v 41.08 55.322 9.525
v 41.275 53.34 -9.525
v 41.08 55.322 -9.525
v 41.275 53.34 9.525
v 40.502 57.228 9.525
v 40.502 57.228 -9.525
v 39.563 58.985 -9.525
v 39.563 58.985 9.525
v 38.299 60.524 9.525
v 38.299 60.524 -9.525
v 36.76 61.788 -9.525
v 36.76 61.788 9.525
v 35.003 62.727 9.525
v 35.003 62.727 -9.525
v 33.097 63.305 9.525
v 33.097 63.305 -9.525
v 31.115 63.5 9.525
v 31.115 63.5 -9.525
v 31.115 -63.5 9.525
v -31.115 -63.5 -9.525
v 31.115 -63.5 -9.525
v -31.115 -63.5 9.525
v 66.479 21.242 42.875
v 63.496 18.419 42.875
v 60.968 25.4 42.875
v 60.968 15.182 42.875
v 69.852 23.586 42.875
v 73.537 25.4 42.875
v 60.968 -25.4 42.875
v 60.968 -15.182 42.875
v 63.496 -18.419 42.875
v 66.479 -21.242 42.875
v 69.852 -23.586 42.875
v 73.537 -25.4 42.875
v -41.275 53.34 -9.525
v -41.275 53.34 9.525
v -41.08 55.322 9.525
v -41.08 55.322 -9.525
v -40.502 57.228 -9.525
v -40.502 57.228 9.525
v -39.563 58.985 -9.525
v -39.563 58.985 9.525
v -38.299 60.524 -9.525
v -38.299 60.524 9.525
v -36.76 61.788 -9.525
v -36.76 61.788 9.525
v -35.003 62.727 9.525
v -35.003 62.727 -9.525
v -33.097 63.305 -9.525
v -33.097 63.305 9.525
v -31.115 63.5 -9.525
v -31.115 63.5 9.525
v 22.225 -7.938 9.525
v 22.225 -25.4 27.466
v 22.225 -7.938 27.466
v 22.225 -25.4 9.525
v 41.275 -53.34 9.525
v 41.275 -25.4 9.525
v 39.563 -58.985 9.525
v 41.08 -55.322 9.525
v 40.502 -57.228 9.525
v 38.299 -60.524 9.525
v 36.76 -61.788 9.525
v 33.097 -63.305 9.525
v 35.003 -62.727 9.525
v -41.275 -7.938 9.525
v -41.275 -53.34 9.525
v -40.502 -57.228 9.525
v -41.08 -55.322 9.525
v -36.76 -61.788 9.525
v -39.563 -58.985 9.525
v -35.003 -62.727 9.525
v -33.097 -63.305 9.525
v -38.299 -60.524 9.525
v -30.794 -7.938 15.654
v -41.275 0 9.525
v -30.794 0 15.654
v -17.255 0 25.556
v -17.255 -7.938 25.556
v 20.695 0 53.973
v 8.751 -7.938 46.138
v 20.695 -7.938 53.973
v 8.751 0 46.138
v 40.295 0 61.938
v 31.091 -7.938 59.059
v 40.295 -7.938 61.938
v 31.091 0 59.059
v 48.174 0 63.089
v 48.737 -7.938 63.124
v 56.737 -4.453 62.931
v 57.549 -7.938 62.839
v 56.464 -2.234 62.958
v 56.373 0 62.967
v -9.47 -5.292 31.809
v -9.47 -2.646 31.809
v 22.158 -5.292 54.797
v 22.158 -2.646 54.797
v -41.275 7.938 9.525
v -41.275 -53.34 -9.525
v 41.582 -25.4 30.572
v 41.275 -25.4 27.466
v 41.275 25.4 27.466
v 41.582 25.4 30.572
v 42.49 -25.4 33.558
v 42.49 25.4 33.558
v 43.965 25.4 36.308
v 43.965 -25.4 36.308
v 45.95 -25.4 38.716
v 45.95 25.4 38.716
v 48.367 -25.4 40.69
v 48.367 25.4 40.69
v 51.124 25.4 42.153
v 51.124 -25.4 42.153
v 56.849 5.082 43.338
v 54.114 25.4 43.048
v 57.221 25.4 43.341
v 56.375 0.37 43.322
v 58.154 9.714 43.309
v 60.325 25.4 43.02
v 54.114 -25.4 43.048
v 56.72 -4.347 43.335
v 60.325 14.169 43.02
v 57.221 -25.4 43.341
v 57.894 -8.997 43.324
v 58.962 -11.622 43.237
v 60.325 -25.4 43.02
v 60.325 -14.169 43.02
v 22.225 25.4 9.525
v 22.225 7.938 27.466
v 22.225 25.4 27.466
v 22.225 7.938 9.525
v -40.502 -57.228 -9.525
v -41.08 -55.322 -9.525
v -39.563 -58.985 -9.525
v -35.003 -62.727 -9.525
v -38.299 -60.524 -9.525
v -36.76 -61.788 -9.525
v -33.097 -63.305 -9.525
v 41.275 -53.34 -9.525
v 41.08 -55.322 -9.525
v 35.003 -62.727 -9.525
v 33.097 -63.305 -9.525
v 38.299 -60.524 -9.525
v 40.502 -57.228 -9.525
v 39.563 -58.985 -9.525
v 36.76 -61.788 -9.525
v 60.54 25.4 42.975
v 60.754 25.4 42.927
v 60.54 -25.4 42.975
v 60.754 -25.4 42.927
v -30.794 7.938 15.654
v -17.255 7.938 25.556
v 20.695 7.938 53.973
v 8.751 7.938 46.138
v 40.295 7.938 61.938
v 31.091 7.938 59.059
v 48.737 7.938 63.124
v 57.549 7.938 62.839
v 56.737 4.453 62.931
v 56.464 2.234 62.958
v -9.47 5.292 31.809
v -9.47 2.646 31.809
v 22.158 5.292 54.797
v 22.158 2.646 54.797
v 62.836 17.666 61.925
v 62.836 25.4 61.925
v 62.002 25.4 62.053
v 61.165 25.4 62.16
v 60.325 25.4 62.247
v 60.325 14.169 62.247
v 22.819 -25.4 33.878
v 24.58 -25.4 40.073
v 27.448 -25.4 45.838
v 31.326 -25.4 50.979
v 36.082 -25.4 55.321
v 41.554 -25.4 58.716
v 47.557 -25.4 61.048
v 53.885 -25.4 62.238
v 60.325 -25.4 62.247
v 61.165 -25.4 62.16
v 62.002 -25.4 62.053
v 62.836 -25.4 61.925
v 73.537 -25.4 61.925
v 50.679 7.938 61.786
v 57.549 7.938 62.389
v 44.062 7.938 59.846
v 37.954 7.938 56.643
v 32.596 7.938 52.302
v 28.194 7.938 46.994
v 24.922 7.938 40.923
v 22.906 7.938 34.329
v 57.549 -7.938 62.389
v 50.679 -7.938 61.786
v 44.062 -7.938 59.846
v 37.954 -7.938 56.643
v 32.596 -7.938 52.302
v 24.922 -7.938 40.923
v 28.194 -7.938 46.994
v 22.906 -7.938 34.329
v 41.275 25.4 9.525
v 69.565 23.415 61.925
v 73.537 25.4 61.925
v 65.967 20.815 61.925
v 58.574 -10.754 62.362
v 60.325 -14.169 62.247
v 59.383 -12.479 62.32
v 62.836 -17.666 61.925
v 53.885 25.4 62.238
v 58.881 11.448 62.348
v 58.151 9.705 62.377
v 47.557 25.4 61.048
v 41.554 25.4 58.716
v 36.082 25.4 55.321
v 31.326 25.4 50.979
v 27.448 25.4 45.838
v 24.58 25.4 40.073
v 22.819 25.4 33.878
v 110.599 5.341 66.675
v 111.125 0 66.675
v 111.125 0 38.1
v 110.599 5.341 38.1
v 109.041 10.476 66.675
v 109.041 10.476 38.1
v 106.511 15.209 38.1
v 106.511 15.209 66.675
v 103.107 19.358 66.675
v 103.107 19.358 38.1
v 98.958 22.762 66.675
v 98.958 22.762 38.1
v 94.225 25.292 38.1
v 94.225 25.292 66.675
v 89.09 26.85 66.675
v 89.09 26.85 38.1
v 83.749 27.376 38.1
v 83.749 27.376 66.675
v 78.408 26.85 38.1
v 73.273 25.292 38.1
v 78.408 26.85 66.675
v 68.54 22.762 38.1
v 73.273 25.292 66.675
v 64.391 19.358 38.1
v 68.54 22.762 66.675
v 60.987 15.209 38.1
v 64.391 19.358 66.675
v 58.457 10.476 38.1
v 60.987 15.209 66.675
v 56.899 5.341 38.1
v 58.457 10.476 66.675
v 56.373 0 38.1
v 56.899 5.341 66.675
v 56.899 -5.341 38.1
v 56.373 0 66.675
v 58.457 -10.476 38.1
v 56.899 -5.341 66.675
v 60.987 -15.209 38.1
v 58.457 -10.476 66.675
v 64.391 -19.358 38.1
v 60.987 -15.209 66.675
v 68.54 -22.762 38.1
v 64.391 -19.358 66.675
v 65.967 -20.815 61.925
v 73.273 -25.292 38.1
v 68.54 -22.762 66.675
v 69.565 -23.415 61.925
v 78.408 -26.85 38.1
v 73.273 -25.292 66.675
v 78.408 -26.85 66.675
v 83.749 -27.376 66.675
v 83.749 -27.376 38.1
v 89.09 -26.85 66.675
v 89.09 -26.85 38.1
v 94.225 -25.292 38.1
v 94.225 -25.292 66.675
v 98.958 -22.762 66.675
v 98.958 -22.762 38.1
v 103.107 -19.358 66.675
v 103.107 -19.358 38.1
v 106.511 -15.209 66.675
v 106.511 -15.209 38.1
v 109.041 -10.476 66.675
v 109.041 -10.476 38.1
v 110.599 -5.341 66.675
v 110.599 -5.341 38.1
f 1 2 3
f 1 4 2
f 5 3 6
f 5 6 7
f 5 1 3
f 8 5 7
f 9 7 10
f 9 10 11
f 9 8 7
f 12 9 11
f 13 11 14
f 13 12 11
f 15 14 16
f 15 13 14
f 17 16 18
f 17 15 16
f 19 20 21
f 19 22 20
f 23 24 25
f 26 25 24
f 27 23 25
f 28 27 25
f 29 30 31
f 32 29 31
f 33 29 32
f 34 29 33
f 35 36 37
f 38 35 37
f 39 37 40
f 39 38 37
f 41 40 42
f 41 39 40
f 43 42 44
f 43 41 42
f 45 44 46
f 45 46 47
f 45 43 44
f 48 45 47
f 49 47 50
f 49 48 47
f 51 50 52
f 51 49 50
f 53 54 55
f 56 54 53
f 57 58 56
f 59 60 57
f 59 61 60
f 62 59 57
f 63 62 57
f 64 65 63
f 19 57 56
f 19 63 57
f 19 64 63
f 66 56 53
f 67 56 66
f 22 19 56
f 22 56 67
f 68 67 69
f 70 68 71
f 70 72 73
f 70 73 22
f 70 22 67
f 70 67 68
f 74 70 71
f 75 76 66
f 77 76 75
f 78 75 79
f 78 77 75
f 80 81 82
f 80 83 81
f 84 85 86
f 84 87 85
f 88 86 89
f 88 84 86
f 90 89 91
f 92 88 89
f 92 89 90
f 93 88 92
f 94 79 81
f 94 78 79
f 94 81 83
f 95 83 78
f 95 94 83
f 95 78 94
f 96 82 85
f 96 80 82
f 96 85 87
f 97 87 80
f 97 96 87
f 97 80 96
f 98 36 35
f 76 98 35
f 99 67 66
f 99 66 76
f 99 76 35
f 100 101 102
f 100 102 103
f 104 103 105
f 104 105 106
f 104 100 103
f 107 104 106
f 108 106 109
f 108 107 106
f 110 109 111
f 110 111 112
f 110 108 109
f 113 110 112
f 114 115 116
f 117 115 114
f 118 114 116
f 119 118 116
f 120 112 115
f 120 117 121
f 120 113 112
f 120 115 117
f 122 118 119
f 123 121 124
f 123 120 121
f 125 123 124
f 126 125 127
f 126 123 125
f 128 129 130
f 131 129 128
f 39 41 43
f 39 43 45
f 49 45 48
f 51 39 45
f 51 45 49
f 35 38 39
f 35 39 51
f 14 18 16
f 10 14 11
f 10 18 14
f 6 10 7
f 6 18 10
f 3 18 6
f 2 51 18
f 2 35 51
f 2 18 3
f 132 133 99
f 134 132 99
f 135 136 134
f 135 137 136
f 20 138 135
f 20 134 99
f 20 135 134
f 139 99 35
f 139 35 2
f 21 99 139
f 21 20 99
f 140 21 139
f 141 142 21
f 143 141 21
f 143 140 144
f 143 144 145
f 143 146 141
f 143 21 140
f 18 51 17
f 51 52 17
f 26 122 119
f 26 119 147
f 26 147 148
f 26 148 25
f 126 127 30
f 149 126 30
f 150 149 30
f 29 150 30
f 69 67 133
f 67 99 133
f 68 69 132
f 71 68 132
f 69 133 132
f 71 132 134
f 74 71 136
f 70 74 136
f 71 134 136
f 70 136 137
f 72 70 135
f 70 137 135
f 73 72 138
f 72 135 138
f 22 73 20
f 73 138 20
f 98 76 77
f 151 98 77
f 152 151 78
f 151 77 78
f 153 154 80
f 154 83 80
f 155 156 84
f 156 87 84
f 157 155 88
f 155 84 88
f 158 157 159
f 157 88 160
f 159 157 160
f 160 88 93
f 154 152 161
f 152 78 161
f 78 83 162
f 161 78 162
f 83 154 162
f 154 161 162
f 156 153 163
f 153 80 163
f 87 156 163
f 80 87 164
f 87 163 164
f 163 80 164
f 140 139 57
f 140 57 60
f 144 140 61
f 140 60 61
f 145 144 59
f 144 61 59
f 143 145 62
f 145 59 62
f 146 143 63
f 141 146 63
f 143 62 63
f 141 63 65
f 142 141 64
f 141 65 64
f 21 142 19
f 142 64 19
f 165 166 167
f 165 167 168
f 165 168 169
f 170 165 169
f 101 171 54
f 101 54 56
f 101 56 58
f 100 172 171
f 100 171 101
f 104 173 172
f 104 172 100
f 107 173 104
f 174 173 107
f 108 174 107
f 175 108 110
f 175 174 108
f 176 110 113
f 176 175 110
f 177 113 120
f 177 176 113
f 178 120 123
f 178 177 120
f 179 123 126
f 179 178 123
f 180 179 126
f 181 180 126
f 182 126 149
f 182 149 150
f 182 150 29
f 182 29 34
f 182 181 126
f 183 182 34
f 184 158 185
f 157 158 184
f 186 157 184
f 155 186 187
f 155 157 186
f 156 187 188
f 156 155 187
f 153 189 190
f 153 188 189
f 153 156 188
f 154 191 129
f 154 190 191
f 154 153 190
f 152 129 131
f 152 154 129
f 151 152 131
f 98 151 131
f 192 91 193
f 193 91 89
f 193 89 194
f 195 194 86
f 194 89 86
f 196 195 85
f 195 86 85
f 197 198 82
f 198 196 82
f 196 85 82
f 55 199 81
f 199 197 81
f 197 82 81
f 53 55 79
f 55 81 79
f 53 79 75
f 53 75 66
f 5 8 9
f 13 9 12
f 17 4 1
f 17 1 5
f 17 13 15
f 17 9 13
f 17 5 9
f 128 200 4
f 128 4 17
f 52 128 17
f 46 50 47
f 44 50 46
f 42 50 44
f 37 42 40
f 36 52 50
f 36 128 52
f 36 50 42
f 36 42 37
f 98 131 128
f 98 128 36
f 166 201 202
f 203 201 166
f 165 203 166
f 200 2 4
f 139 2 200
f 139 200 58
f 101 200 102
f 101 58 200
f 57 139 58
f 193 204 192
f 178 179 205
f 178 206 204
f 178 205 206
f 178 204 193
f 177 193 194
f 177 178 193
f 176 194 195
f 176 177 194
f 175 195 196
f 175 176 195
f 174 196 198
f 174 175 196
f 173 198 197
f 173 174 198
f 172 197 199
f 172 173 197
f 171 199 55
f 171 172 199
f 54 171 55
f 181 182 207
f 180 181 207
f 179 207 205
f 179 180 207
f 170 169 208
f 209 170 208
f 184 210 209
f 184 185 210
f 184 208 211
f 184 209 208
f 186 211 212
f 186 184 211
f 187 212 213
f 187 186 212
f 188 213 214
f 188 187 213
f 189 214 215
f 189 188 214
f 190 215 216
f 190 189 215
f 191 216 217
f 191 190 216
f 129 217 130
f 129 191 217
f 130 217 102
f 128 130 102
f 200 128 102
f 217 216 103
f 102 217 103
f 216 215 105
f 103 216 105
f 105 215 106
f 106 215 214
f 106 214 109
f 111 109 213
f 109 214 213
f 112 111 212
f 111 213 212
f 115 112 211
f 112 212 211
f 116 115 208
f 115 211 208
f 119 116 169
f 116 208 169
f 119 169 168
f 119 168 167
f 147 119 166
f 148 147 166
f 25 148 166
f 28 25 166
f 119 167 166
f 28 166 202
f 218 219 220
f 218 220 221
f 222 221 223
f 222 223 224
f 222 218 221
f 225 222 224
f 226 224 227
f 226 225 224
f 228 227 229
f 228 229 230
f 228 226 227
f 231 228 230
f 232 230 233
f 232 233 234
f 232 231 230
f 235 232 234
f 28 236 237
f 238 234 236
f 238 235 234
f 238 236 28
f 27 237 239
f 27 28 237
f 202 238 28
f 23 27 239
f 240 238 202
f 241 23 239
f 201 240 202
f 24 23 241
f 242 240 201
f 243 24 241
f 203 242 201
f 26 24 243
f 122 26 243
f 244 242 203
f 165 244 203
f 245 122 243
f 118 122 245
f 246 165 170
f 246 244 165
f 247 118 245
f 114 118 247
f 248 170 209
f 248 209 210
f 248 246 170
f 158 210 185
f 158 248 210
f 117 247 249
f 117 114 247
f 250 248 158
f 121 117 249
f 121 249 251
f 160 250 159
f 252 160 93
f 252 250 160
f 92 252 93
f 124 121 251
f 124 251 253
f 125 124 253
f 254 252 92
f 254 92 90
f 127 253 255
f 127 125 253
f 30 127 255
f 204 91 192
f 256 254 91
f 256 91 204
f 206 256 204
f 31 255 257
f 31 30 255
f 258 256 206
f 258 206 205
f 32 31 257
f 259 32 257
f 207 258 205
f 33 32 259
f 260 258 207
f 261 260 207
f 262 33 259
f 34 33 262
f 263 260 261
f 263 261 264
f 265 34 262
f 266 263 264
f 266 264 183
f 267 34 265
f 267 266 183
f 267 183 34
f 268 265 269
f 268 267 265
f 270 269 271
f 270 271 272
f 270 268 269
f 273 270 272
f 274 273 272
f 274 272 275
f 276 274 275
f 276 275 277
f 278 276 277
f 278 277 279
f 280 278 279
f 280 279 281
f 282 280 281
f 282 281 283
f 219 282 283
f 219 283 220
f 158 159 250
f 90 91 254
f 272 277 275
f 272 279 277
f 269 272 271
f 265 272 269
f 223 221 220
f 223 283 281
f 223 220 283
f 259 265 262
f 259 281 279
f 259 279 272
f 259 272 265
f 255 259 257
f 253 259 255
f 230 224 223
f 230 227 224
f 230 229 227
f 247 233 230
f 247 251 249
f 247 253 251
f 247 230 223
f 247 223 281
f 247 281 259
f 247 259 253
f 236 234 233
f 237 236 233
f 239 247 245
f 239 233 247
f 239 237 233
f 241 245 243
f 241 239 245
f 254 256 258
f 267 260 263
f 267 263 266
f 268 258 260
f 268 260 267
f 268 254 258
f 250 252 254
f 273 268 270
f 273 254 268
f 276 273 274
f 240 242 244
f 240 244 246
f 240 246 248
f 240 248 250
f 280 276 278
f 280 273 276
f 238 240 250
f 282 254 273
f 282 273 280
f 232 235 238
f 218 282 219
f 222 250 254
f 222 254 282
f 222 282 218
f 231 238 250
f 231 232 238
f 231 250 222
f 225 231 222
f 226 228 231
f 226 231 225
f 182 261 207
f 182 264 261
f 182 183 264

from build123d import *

# Parameters (mm, degrees)
F1_DEPTH = 63.5
F2_DEPTH = 25.4
F3_DEPTH = 25.4
F4_DEPTH = 7.9375
F6_R     = 10.16


with BuildPart() as f1:
    # F0 (on Front) → F1 (new body, symmetric)
    with BuildSketch(Plane.XZ):
        Polygon((22.225, 9.525), (-41.275, 9.525), (-41.275, -9.525), (41.275, -9.525), (41.275, 9.525), align=None)
    extrude(amount=F1_DEPTH, both=True)

    # F0 (on Front) → F2 (join, symmetric)
    with BuildSketch(Plane.XZ):
        with BuildLine():
            Line((22.225, 27.466178), (22.225, 9.525))
            Line((22.225, 9.525), (41.275, 9.525))
            Line((41.275, 9.525), (41.275, 27.466178))
            ThreePointArc((41.275, 27.466178), (47.109768, 39.762901), (60.325, 43.020438))
            Line((60.325, 43.020438), (60.325, 62.246561))
            ThreePointArc((60.325, 62.246561), (33.60357, 53.26), (22.225, 27.466178))
        make_face()
    extrude(amount=F2_DEPTH, both=True)

    # F0 (on Front) → F3 (join, symmetric)
    with BuildSketch(Plane.XZ):
        with BuildLine():
            ThreePointArc((62.836075, 61.9252), (61.58345, 62.10864), (60.325, 62.246561))
            Line((60.325, 62.246561), (60.325, 43.020438))
            ThreePointArc((60.325, 43.020438), (60.64729, 42.951158), (60.968073, 42.8752))
            Line((60.968073, 42.8752), (83.748926, 42.8752))
            Line((83.748926, 42.8752), (83.748926, 61.9252))
            Line((83.748926, 61.9252), (62.836075, 61.9252))
        make_face()
    extrude(amount=F3_DEPTH, both=True)

    # F0 (on Front) → F4 (join, symmetric)
    with BuildSketch(Plane.XZ):
        with BuildLine():
            add(Edge.make_bspline(
                [(-41.275, 9.525), (-7.276739, 26.636683), (20.247733, 69.46599), (60.325, 62.428354)],
                knots=[0, 0, 0, 0, 114.185038, 114.185038, 114.185038, 114.185038], degree=3))
            Line((-41.275, 9.525), (22.225, 9.525))
            Line((22.225, 9.525), (22.225, 27.466178))
            ThreePointArc((22.225, 27.466178), (33.60357, 53.26), (60.325, 62.246561))
            Line((60.325, 62.246561), (60.325, 62.428354))
        make_face()
    extrude(amount=F4_DEPTH, both=True)

    # F0 (on Front) → F5 (revolve)
    with BuildSketch(Plane.XZ):
        Polygon((111.125, 66.675), (83.748926, 66.675), (83.748926, 61.9252), (83.748926, 42.8752), (83.748926, 38.1), (111.125, 38.1), align=None)
    revolve(axis=Axis((83.748926, 0, 52.3875), (0, 0, 1)))

    # F6
    f6_edges = [f1.edges().sort_by_distance(p)[0] for p in [
        (41.275, 63.5, 0),
        (-41.275, 63.5, 0),
        (41.275, -63.5, 0),
        (-41.275, -63.5, 0),
    ]]
    fillet(f6_edges, radius=F6_R)


solid = f1.part
